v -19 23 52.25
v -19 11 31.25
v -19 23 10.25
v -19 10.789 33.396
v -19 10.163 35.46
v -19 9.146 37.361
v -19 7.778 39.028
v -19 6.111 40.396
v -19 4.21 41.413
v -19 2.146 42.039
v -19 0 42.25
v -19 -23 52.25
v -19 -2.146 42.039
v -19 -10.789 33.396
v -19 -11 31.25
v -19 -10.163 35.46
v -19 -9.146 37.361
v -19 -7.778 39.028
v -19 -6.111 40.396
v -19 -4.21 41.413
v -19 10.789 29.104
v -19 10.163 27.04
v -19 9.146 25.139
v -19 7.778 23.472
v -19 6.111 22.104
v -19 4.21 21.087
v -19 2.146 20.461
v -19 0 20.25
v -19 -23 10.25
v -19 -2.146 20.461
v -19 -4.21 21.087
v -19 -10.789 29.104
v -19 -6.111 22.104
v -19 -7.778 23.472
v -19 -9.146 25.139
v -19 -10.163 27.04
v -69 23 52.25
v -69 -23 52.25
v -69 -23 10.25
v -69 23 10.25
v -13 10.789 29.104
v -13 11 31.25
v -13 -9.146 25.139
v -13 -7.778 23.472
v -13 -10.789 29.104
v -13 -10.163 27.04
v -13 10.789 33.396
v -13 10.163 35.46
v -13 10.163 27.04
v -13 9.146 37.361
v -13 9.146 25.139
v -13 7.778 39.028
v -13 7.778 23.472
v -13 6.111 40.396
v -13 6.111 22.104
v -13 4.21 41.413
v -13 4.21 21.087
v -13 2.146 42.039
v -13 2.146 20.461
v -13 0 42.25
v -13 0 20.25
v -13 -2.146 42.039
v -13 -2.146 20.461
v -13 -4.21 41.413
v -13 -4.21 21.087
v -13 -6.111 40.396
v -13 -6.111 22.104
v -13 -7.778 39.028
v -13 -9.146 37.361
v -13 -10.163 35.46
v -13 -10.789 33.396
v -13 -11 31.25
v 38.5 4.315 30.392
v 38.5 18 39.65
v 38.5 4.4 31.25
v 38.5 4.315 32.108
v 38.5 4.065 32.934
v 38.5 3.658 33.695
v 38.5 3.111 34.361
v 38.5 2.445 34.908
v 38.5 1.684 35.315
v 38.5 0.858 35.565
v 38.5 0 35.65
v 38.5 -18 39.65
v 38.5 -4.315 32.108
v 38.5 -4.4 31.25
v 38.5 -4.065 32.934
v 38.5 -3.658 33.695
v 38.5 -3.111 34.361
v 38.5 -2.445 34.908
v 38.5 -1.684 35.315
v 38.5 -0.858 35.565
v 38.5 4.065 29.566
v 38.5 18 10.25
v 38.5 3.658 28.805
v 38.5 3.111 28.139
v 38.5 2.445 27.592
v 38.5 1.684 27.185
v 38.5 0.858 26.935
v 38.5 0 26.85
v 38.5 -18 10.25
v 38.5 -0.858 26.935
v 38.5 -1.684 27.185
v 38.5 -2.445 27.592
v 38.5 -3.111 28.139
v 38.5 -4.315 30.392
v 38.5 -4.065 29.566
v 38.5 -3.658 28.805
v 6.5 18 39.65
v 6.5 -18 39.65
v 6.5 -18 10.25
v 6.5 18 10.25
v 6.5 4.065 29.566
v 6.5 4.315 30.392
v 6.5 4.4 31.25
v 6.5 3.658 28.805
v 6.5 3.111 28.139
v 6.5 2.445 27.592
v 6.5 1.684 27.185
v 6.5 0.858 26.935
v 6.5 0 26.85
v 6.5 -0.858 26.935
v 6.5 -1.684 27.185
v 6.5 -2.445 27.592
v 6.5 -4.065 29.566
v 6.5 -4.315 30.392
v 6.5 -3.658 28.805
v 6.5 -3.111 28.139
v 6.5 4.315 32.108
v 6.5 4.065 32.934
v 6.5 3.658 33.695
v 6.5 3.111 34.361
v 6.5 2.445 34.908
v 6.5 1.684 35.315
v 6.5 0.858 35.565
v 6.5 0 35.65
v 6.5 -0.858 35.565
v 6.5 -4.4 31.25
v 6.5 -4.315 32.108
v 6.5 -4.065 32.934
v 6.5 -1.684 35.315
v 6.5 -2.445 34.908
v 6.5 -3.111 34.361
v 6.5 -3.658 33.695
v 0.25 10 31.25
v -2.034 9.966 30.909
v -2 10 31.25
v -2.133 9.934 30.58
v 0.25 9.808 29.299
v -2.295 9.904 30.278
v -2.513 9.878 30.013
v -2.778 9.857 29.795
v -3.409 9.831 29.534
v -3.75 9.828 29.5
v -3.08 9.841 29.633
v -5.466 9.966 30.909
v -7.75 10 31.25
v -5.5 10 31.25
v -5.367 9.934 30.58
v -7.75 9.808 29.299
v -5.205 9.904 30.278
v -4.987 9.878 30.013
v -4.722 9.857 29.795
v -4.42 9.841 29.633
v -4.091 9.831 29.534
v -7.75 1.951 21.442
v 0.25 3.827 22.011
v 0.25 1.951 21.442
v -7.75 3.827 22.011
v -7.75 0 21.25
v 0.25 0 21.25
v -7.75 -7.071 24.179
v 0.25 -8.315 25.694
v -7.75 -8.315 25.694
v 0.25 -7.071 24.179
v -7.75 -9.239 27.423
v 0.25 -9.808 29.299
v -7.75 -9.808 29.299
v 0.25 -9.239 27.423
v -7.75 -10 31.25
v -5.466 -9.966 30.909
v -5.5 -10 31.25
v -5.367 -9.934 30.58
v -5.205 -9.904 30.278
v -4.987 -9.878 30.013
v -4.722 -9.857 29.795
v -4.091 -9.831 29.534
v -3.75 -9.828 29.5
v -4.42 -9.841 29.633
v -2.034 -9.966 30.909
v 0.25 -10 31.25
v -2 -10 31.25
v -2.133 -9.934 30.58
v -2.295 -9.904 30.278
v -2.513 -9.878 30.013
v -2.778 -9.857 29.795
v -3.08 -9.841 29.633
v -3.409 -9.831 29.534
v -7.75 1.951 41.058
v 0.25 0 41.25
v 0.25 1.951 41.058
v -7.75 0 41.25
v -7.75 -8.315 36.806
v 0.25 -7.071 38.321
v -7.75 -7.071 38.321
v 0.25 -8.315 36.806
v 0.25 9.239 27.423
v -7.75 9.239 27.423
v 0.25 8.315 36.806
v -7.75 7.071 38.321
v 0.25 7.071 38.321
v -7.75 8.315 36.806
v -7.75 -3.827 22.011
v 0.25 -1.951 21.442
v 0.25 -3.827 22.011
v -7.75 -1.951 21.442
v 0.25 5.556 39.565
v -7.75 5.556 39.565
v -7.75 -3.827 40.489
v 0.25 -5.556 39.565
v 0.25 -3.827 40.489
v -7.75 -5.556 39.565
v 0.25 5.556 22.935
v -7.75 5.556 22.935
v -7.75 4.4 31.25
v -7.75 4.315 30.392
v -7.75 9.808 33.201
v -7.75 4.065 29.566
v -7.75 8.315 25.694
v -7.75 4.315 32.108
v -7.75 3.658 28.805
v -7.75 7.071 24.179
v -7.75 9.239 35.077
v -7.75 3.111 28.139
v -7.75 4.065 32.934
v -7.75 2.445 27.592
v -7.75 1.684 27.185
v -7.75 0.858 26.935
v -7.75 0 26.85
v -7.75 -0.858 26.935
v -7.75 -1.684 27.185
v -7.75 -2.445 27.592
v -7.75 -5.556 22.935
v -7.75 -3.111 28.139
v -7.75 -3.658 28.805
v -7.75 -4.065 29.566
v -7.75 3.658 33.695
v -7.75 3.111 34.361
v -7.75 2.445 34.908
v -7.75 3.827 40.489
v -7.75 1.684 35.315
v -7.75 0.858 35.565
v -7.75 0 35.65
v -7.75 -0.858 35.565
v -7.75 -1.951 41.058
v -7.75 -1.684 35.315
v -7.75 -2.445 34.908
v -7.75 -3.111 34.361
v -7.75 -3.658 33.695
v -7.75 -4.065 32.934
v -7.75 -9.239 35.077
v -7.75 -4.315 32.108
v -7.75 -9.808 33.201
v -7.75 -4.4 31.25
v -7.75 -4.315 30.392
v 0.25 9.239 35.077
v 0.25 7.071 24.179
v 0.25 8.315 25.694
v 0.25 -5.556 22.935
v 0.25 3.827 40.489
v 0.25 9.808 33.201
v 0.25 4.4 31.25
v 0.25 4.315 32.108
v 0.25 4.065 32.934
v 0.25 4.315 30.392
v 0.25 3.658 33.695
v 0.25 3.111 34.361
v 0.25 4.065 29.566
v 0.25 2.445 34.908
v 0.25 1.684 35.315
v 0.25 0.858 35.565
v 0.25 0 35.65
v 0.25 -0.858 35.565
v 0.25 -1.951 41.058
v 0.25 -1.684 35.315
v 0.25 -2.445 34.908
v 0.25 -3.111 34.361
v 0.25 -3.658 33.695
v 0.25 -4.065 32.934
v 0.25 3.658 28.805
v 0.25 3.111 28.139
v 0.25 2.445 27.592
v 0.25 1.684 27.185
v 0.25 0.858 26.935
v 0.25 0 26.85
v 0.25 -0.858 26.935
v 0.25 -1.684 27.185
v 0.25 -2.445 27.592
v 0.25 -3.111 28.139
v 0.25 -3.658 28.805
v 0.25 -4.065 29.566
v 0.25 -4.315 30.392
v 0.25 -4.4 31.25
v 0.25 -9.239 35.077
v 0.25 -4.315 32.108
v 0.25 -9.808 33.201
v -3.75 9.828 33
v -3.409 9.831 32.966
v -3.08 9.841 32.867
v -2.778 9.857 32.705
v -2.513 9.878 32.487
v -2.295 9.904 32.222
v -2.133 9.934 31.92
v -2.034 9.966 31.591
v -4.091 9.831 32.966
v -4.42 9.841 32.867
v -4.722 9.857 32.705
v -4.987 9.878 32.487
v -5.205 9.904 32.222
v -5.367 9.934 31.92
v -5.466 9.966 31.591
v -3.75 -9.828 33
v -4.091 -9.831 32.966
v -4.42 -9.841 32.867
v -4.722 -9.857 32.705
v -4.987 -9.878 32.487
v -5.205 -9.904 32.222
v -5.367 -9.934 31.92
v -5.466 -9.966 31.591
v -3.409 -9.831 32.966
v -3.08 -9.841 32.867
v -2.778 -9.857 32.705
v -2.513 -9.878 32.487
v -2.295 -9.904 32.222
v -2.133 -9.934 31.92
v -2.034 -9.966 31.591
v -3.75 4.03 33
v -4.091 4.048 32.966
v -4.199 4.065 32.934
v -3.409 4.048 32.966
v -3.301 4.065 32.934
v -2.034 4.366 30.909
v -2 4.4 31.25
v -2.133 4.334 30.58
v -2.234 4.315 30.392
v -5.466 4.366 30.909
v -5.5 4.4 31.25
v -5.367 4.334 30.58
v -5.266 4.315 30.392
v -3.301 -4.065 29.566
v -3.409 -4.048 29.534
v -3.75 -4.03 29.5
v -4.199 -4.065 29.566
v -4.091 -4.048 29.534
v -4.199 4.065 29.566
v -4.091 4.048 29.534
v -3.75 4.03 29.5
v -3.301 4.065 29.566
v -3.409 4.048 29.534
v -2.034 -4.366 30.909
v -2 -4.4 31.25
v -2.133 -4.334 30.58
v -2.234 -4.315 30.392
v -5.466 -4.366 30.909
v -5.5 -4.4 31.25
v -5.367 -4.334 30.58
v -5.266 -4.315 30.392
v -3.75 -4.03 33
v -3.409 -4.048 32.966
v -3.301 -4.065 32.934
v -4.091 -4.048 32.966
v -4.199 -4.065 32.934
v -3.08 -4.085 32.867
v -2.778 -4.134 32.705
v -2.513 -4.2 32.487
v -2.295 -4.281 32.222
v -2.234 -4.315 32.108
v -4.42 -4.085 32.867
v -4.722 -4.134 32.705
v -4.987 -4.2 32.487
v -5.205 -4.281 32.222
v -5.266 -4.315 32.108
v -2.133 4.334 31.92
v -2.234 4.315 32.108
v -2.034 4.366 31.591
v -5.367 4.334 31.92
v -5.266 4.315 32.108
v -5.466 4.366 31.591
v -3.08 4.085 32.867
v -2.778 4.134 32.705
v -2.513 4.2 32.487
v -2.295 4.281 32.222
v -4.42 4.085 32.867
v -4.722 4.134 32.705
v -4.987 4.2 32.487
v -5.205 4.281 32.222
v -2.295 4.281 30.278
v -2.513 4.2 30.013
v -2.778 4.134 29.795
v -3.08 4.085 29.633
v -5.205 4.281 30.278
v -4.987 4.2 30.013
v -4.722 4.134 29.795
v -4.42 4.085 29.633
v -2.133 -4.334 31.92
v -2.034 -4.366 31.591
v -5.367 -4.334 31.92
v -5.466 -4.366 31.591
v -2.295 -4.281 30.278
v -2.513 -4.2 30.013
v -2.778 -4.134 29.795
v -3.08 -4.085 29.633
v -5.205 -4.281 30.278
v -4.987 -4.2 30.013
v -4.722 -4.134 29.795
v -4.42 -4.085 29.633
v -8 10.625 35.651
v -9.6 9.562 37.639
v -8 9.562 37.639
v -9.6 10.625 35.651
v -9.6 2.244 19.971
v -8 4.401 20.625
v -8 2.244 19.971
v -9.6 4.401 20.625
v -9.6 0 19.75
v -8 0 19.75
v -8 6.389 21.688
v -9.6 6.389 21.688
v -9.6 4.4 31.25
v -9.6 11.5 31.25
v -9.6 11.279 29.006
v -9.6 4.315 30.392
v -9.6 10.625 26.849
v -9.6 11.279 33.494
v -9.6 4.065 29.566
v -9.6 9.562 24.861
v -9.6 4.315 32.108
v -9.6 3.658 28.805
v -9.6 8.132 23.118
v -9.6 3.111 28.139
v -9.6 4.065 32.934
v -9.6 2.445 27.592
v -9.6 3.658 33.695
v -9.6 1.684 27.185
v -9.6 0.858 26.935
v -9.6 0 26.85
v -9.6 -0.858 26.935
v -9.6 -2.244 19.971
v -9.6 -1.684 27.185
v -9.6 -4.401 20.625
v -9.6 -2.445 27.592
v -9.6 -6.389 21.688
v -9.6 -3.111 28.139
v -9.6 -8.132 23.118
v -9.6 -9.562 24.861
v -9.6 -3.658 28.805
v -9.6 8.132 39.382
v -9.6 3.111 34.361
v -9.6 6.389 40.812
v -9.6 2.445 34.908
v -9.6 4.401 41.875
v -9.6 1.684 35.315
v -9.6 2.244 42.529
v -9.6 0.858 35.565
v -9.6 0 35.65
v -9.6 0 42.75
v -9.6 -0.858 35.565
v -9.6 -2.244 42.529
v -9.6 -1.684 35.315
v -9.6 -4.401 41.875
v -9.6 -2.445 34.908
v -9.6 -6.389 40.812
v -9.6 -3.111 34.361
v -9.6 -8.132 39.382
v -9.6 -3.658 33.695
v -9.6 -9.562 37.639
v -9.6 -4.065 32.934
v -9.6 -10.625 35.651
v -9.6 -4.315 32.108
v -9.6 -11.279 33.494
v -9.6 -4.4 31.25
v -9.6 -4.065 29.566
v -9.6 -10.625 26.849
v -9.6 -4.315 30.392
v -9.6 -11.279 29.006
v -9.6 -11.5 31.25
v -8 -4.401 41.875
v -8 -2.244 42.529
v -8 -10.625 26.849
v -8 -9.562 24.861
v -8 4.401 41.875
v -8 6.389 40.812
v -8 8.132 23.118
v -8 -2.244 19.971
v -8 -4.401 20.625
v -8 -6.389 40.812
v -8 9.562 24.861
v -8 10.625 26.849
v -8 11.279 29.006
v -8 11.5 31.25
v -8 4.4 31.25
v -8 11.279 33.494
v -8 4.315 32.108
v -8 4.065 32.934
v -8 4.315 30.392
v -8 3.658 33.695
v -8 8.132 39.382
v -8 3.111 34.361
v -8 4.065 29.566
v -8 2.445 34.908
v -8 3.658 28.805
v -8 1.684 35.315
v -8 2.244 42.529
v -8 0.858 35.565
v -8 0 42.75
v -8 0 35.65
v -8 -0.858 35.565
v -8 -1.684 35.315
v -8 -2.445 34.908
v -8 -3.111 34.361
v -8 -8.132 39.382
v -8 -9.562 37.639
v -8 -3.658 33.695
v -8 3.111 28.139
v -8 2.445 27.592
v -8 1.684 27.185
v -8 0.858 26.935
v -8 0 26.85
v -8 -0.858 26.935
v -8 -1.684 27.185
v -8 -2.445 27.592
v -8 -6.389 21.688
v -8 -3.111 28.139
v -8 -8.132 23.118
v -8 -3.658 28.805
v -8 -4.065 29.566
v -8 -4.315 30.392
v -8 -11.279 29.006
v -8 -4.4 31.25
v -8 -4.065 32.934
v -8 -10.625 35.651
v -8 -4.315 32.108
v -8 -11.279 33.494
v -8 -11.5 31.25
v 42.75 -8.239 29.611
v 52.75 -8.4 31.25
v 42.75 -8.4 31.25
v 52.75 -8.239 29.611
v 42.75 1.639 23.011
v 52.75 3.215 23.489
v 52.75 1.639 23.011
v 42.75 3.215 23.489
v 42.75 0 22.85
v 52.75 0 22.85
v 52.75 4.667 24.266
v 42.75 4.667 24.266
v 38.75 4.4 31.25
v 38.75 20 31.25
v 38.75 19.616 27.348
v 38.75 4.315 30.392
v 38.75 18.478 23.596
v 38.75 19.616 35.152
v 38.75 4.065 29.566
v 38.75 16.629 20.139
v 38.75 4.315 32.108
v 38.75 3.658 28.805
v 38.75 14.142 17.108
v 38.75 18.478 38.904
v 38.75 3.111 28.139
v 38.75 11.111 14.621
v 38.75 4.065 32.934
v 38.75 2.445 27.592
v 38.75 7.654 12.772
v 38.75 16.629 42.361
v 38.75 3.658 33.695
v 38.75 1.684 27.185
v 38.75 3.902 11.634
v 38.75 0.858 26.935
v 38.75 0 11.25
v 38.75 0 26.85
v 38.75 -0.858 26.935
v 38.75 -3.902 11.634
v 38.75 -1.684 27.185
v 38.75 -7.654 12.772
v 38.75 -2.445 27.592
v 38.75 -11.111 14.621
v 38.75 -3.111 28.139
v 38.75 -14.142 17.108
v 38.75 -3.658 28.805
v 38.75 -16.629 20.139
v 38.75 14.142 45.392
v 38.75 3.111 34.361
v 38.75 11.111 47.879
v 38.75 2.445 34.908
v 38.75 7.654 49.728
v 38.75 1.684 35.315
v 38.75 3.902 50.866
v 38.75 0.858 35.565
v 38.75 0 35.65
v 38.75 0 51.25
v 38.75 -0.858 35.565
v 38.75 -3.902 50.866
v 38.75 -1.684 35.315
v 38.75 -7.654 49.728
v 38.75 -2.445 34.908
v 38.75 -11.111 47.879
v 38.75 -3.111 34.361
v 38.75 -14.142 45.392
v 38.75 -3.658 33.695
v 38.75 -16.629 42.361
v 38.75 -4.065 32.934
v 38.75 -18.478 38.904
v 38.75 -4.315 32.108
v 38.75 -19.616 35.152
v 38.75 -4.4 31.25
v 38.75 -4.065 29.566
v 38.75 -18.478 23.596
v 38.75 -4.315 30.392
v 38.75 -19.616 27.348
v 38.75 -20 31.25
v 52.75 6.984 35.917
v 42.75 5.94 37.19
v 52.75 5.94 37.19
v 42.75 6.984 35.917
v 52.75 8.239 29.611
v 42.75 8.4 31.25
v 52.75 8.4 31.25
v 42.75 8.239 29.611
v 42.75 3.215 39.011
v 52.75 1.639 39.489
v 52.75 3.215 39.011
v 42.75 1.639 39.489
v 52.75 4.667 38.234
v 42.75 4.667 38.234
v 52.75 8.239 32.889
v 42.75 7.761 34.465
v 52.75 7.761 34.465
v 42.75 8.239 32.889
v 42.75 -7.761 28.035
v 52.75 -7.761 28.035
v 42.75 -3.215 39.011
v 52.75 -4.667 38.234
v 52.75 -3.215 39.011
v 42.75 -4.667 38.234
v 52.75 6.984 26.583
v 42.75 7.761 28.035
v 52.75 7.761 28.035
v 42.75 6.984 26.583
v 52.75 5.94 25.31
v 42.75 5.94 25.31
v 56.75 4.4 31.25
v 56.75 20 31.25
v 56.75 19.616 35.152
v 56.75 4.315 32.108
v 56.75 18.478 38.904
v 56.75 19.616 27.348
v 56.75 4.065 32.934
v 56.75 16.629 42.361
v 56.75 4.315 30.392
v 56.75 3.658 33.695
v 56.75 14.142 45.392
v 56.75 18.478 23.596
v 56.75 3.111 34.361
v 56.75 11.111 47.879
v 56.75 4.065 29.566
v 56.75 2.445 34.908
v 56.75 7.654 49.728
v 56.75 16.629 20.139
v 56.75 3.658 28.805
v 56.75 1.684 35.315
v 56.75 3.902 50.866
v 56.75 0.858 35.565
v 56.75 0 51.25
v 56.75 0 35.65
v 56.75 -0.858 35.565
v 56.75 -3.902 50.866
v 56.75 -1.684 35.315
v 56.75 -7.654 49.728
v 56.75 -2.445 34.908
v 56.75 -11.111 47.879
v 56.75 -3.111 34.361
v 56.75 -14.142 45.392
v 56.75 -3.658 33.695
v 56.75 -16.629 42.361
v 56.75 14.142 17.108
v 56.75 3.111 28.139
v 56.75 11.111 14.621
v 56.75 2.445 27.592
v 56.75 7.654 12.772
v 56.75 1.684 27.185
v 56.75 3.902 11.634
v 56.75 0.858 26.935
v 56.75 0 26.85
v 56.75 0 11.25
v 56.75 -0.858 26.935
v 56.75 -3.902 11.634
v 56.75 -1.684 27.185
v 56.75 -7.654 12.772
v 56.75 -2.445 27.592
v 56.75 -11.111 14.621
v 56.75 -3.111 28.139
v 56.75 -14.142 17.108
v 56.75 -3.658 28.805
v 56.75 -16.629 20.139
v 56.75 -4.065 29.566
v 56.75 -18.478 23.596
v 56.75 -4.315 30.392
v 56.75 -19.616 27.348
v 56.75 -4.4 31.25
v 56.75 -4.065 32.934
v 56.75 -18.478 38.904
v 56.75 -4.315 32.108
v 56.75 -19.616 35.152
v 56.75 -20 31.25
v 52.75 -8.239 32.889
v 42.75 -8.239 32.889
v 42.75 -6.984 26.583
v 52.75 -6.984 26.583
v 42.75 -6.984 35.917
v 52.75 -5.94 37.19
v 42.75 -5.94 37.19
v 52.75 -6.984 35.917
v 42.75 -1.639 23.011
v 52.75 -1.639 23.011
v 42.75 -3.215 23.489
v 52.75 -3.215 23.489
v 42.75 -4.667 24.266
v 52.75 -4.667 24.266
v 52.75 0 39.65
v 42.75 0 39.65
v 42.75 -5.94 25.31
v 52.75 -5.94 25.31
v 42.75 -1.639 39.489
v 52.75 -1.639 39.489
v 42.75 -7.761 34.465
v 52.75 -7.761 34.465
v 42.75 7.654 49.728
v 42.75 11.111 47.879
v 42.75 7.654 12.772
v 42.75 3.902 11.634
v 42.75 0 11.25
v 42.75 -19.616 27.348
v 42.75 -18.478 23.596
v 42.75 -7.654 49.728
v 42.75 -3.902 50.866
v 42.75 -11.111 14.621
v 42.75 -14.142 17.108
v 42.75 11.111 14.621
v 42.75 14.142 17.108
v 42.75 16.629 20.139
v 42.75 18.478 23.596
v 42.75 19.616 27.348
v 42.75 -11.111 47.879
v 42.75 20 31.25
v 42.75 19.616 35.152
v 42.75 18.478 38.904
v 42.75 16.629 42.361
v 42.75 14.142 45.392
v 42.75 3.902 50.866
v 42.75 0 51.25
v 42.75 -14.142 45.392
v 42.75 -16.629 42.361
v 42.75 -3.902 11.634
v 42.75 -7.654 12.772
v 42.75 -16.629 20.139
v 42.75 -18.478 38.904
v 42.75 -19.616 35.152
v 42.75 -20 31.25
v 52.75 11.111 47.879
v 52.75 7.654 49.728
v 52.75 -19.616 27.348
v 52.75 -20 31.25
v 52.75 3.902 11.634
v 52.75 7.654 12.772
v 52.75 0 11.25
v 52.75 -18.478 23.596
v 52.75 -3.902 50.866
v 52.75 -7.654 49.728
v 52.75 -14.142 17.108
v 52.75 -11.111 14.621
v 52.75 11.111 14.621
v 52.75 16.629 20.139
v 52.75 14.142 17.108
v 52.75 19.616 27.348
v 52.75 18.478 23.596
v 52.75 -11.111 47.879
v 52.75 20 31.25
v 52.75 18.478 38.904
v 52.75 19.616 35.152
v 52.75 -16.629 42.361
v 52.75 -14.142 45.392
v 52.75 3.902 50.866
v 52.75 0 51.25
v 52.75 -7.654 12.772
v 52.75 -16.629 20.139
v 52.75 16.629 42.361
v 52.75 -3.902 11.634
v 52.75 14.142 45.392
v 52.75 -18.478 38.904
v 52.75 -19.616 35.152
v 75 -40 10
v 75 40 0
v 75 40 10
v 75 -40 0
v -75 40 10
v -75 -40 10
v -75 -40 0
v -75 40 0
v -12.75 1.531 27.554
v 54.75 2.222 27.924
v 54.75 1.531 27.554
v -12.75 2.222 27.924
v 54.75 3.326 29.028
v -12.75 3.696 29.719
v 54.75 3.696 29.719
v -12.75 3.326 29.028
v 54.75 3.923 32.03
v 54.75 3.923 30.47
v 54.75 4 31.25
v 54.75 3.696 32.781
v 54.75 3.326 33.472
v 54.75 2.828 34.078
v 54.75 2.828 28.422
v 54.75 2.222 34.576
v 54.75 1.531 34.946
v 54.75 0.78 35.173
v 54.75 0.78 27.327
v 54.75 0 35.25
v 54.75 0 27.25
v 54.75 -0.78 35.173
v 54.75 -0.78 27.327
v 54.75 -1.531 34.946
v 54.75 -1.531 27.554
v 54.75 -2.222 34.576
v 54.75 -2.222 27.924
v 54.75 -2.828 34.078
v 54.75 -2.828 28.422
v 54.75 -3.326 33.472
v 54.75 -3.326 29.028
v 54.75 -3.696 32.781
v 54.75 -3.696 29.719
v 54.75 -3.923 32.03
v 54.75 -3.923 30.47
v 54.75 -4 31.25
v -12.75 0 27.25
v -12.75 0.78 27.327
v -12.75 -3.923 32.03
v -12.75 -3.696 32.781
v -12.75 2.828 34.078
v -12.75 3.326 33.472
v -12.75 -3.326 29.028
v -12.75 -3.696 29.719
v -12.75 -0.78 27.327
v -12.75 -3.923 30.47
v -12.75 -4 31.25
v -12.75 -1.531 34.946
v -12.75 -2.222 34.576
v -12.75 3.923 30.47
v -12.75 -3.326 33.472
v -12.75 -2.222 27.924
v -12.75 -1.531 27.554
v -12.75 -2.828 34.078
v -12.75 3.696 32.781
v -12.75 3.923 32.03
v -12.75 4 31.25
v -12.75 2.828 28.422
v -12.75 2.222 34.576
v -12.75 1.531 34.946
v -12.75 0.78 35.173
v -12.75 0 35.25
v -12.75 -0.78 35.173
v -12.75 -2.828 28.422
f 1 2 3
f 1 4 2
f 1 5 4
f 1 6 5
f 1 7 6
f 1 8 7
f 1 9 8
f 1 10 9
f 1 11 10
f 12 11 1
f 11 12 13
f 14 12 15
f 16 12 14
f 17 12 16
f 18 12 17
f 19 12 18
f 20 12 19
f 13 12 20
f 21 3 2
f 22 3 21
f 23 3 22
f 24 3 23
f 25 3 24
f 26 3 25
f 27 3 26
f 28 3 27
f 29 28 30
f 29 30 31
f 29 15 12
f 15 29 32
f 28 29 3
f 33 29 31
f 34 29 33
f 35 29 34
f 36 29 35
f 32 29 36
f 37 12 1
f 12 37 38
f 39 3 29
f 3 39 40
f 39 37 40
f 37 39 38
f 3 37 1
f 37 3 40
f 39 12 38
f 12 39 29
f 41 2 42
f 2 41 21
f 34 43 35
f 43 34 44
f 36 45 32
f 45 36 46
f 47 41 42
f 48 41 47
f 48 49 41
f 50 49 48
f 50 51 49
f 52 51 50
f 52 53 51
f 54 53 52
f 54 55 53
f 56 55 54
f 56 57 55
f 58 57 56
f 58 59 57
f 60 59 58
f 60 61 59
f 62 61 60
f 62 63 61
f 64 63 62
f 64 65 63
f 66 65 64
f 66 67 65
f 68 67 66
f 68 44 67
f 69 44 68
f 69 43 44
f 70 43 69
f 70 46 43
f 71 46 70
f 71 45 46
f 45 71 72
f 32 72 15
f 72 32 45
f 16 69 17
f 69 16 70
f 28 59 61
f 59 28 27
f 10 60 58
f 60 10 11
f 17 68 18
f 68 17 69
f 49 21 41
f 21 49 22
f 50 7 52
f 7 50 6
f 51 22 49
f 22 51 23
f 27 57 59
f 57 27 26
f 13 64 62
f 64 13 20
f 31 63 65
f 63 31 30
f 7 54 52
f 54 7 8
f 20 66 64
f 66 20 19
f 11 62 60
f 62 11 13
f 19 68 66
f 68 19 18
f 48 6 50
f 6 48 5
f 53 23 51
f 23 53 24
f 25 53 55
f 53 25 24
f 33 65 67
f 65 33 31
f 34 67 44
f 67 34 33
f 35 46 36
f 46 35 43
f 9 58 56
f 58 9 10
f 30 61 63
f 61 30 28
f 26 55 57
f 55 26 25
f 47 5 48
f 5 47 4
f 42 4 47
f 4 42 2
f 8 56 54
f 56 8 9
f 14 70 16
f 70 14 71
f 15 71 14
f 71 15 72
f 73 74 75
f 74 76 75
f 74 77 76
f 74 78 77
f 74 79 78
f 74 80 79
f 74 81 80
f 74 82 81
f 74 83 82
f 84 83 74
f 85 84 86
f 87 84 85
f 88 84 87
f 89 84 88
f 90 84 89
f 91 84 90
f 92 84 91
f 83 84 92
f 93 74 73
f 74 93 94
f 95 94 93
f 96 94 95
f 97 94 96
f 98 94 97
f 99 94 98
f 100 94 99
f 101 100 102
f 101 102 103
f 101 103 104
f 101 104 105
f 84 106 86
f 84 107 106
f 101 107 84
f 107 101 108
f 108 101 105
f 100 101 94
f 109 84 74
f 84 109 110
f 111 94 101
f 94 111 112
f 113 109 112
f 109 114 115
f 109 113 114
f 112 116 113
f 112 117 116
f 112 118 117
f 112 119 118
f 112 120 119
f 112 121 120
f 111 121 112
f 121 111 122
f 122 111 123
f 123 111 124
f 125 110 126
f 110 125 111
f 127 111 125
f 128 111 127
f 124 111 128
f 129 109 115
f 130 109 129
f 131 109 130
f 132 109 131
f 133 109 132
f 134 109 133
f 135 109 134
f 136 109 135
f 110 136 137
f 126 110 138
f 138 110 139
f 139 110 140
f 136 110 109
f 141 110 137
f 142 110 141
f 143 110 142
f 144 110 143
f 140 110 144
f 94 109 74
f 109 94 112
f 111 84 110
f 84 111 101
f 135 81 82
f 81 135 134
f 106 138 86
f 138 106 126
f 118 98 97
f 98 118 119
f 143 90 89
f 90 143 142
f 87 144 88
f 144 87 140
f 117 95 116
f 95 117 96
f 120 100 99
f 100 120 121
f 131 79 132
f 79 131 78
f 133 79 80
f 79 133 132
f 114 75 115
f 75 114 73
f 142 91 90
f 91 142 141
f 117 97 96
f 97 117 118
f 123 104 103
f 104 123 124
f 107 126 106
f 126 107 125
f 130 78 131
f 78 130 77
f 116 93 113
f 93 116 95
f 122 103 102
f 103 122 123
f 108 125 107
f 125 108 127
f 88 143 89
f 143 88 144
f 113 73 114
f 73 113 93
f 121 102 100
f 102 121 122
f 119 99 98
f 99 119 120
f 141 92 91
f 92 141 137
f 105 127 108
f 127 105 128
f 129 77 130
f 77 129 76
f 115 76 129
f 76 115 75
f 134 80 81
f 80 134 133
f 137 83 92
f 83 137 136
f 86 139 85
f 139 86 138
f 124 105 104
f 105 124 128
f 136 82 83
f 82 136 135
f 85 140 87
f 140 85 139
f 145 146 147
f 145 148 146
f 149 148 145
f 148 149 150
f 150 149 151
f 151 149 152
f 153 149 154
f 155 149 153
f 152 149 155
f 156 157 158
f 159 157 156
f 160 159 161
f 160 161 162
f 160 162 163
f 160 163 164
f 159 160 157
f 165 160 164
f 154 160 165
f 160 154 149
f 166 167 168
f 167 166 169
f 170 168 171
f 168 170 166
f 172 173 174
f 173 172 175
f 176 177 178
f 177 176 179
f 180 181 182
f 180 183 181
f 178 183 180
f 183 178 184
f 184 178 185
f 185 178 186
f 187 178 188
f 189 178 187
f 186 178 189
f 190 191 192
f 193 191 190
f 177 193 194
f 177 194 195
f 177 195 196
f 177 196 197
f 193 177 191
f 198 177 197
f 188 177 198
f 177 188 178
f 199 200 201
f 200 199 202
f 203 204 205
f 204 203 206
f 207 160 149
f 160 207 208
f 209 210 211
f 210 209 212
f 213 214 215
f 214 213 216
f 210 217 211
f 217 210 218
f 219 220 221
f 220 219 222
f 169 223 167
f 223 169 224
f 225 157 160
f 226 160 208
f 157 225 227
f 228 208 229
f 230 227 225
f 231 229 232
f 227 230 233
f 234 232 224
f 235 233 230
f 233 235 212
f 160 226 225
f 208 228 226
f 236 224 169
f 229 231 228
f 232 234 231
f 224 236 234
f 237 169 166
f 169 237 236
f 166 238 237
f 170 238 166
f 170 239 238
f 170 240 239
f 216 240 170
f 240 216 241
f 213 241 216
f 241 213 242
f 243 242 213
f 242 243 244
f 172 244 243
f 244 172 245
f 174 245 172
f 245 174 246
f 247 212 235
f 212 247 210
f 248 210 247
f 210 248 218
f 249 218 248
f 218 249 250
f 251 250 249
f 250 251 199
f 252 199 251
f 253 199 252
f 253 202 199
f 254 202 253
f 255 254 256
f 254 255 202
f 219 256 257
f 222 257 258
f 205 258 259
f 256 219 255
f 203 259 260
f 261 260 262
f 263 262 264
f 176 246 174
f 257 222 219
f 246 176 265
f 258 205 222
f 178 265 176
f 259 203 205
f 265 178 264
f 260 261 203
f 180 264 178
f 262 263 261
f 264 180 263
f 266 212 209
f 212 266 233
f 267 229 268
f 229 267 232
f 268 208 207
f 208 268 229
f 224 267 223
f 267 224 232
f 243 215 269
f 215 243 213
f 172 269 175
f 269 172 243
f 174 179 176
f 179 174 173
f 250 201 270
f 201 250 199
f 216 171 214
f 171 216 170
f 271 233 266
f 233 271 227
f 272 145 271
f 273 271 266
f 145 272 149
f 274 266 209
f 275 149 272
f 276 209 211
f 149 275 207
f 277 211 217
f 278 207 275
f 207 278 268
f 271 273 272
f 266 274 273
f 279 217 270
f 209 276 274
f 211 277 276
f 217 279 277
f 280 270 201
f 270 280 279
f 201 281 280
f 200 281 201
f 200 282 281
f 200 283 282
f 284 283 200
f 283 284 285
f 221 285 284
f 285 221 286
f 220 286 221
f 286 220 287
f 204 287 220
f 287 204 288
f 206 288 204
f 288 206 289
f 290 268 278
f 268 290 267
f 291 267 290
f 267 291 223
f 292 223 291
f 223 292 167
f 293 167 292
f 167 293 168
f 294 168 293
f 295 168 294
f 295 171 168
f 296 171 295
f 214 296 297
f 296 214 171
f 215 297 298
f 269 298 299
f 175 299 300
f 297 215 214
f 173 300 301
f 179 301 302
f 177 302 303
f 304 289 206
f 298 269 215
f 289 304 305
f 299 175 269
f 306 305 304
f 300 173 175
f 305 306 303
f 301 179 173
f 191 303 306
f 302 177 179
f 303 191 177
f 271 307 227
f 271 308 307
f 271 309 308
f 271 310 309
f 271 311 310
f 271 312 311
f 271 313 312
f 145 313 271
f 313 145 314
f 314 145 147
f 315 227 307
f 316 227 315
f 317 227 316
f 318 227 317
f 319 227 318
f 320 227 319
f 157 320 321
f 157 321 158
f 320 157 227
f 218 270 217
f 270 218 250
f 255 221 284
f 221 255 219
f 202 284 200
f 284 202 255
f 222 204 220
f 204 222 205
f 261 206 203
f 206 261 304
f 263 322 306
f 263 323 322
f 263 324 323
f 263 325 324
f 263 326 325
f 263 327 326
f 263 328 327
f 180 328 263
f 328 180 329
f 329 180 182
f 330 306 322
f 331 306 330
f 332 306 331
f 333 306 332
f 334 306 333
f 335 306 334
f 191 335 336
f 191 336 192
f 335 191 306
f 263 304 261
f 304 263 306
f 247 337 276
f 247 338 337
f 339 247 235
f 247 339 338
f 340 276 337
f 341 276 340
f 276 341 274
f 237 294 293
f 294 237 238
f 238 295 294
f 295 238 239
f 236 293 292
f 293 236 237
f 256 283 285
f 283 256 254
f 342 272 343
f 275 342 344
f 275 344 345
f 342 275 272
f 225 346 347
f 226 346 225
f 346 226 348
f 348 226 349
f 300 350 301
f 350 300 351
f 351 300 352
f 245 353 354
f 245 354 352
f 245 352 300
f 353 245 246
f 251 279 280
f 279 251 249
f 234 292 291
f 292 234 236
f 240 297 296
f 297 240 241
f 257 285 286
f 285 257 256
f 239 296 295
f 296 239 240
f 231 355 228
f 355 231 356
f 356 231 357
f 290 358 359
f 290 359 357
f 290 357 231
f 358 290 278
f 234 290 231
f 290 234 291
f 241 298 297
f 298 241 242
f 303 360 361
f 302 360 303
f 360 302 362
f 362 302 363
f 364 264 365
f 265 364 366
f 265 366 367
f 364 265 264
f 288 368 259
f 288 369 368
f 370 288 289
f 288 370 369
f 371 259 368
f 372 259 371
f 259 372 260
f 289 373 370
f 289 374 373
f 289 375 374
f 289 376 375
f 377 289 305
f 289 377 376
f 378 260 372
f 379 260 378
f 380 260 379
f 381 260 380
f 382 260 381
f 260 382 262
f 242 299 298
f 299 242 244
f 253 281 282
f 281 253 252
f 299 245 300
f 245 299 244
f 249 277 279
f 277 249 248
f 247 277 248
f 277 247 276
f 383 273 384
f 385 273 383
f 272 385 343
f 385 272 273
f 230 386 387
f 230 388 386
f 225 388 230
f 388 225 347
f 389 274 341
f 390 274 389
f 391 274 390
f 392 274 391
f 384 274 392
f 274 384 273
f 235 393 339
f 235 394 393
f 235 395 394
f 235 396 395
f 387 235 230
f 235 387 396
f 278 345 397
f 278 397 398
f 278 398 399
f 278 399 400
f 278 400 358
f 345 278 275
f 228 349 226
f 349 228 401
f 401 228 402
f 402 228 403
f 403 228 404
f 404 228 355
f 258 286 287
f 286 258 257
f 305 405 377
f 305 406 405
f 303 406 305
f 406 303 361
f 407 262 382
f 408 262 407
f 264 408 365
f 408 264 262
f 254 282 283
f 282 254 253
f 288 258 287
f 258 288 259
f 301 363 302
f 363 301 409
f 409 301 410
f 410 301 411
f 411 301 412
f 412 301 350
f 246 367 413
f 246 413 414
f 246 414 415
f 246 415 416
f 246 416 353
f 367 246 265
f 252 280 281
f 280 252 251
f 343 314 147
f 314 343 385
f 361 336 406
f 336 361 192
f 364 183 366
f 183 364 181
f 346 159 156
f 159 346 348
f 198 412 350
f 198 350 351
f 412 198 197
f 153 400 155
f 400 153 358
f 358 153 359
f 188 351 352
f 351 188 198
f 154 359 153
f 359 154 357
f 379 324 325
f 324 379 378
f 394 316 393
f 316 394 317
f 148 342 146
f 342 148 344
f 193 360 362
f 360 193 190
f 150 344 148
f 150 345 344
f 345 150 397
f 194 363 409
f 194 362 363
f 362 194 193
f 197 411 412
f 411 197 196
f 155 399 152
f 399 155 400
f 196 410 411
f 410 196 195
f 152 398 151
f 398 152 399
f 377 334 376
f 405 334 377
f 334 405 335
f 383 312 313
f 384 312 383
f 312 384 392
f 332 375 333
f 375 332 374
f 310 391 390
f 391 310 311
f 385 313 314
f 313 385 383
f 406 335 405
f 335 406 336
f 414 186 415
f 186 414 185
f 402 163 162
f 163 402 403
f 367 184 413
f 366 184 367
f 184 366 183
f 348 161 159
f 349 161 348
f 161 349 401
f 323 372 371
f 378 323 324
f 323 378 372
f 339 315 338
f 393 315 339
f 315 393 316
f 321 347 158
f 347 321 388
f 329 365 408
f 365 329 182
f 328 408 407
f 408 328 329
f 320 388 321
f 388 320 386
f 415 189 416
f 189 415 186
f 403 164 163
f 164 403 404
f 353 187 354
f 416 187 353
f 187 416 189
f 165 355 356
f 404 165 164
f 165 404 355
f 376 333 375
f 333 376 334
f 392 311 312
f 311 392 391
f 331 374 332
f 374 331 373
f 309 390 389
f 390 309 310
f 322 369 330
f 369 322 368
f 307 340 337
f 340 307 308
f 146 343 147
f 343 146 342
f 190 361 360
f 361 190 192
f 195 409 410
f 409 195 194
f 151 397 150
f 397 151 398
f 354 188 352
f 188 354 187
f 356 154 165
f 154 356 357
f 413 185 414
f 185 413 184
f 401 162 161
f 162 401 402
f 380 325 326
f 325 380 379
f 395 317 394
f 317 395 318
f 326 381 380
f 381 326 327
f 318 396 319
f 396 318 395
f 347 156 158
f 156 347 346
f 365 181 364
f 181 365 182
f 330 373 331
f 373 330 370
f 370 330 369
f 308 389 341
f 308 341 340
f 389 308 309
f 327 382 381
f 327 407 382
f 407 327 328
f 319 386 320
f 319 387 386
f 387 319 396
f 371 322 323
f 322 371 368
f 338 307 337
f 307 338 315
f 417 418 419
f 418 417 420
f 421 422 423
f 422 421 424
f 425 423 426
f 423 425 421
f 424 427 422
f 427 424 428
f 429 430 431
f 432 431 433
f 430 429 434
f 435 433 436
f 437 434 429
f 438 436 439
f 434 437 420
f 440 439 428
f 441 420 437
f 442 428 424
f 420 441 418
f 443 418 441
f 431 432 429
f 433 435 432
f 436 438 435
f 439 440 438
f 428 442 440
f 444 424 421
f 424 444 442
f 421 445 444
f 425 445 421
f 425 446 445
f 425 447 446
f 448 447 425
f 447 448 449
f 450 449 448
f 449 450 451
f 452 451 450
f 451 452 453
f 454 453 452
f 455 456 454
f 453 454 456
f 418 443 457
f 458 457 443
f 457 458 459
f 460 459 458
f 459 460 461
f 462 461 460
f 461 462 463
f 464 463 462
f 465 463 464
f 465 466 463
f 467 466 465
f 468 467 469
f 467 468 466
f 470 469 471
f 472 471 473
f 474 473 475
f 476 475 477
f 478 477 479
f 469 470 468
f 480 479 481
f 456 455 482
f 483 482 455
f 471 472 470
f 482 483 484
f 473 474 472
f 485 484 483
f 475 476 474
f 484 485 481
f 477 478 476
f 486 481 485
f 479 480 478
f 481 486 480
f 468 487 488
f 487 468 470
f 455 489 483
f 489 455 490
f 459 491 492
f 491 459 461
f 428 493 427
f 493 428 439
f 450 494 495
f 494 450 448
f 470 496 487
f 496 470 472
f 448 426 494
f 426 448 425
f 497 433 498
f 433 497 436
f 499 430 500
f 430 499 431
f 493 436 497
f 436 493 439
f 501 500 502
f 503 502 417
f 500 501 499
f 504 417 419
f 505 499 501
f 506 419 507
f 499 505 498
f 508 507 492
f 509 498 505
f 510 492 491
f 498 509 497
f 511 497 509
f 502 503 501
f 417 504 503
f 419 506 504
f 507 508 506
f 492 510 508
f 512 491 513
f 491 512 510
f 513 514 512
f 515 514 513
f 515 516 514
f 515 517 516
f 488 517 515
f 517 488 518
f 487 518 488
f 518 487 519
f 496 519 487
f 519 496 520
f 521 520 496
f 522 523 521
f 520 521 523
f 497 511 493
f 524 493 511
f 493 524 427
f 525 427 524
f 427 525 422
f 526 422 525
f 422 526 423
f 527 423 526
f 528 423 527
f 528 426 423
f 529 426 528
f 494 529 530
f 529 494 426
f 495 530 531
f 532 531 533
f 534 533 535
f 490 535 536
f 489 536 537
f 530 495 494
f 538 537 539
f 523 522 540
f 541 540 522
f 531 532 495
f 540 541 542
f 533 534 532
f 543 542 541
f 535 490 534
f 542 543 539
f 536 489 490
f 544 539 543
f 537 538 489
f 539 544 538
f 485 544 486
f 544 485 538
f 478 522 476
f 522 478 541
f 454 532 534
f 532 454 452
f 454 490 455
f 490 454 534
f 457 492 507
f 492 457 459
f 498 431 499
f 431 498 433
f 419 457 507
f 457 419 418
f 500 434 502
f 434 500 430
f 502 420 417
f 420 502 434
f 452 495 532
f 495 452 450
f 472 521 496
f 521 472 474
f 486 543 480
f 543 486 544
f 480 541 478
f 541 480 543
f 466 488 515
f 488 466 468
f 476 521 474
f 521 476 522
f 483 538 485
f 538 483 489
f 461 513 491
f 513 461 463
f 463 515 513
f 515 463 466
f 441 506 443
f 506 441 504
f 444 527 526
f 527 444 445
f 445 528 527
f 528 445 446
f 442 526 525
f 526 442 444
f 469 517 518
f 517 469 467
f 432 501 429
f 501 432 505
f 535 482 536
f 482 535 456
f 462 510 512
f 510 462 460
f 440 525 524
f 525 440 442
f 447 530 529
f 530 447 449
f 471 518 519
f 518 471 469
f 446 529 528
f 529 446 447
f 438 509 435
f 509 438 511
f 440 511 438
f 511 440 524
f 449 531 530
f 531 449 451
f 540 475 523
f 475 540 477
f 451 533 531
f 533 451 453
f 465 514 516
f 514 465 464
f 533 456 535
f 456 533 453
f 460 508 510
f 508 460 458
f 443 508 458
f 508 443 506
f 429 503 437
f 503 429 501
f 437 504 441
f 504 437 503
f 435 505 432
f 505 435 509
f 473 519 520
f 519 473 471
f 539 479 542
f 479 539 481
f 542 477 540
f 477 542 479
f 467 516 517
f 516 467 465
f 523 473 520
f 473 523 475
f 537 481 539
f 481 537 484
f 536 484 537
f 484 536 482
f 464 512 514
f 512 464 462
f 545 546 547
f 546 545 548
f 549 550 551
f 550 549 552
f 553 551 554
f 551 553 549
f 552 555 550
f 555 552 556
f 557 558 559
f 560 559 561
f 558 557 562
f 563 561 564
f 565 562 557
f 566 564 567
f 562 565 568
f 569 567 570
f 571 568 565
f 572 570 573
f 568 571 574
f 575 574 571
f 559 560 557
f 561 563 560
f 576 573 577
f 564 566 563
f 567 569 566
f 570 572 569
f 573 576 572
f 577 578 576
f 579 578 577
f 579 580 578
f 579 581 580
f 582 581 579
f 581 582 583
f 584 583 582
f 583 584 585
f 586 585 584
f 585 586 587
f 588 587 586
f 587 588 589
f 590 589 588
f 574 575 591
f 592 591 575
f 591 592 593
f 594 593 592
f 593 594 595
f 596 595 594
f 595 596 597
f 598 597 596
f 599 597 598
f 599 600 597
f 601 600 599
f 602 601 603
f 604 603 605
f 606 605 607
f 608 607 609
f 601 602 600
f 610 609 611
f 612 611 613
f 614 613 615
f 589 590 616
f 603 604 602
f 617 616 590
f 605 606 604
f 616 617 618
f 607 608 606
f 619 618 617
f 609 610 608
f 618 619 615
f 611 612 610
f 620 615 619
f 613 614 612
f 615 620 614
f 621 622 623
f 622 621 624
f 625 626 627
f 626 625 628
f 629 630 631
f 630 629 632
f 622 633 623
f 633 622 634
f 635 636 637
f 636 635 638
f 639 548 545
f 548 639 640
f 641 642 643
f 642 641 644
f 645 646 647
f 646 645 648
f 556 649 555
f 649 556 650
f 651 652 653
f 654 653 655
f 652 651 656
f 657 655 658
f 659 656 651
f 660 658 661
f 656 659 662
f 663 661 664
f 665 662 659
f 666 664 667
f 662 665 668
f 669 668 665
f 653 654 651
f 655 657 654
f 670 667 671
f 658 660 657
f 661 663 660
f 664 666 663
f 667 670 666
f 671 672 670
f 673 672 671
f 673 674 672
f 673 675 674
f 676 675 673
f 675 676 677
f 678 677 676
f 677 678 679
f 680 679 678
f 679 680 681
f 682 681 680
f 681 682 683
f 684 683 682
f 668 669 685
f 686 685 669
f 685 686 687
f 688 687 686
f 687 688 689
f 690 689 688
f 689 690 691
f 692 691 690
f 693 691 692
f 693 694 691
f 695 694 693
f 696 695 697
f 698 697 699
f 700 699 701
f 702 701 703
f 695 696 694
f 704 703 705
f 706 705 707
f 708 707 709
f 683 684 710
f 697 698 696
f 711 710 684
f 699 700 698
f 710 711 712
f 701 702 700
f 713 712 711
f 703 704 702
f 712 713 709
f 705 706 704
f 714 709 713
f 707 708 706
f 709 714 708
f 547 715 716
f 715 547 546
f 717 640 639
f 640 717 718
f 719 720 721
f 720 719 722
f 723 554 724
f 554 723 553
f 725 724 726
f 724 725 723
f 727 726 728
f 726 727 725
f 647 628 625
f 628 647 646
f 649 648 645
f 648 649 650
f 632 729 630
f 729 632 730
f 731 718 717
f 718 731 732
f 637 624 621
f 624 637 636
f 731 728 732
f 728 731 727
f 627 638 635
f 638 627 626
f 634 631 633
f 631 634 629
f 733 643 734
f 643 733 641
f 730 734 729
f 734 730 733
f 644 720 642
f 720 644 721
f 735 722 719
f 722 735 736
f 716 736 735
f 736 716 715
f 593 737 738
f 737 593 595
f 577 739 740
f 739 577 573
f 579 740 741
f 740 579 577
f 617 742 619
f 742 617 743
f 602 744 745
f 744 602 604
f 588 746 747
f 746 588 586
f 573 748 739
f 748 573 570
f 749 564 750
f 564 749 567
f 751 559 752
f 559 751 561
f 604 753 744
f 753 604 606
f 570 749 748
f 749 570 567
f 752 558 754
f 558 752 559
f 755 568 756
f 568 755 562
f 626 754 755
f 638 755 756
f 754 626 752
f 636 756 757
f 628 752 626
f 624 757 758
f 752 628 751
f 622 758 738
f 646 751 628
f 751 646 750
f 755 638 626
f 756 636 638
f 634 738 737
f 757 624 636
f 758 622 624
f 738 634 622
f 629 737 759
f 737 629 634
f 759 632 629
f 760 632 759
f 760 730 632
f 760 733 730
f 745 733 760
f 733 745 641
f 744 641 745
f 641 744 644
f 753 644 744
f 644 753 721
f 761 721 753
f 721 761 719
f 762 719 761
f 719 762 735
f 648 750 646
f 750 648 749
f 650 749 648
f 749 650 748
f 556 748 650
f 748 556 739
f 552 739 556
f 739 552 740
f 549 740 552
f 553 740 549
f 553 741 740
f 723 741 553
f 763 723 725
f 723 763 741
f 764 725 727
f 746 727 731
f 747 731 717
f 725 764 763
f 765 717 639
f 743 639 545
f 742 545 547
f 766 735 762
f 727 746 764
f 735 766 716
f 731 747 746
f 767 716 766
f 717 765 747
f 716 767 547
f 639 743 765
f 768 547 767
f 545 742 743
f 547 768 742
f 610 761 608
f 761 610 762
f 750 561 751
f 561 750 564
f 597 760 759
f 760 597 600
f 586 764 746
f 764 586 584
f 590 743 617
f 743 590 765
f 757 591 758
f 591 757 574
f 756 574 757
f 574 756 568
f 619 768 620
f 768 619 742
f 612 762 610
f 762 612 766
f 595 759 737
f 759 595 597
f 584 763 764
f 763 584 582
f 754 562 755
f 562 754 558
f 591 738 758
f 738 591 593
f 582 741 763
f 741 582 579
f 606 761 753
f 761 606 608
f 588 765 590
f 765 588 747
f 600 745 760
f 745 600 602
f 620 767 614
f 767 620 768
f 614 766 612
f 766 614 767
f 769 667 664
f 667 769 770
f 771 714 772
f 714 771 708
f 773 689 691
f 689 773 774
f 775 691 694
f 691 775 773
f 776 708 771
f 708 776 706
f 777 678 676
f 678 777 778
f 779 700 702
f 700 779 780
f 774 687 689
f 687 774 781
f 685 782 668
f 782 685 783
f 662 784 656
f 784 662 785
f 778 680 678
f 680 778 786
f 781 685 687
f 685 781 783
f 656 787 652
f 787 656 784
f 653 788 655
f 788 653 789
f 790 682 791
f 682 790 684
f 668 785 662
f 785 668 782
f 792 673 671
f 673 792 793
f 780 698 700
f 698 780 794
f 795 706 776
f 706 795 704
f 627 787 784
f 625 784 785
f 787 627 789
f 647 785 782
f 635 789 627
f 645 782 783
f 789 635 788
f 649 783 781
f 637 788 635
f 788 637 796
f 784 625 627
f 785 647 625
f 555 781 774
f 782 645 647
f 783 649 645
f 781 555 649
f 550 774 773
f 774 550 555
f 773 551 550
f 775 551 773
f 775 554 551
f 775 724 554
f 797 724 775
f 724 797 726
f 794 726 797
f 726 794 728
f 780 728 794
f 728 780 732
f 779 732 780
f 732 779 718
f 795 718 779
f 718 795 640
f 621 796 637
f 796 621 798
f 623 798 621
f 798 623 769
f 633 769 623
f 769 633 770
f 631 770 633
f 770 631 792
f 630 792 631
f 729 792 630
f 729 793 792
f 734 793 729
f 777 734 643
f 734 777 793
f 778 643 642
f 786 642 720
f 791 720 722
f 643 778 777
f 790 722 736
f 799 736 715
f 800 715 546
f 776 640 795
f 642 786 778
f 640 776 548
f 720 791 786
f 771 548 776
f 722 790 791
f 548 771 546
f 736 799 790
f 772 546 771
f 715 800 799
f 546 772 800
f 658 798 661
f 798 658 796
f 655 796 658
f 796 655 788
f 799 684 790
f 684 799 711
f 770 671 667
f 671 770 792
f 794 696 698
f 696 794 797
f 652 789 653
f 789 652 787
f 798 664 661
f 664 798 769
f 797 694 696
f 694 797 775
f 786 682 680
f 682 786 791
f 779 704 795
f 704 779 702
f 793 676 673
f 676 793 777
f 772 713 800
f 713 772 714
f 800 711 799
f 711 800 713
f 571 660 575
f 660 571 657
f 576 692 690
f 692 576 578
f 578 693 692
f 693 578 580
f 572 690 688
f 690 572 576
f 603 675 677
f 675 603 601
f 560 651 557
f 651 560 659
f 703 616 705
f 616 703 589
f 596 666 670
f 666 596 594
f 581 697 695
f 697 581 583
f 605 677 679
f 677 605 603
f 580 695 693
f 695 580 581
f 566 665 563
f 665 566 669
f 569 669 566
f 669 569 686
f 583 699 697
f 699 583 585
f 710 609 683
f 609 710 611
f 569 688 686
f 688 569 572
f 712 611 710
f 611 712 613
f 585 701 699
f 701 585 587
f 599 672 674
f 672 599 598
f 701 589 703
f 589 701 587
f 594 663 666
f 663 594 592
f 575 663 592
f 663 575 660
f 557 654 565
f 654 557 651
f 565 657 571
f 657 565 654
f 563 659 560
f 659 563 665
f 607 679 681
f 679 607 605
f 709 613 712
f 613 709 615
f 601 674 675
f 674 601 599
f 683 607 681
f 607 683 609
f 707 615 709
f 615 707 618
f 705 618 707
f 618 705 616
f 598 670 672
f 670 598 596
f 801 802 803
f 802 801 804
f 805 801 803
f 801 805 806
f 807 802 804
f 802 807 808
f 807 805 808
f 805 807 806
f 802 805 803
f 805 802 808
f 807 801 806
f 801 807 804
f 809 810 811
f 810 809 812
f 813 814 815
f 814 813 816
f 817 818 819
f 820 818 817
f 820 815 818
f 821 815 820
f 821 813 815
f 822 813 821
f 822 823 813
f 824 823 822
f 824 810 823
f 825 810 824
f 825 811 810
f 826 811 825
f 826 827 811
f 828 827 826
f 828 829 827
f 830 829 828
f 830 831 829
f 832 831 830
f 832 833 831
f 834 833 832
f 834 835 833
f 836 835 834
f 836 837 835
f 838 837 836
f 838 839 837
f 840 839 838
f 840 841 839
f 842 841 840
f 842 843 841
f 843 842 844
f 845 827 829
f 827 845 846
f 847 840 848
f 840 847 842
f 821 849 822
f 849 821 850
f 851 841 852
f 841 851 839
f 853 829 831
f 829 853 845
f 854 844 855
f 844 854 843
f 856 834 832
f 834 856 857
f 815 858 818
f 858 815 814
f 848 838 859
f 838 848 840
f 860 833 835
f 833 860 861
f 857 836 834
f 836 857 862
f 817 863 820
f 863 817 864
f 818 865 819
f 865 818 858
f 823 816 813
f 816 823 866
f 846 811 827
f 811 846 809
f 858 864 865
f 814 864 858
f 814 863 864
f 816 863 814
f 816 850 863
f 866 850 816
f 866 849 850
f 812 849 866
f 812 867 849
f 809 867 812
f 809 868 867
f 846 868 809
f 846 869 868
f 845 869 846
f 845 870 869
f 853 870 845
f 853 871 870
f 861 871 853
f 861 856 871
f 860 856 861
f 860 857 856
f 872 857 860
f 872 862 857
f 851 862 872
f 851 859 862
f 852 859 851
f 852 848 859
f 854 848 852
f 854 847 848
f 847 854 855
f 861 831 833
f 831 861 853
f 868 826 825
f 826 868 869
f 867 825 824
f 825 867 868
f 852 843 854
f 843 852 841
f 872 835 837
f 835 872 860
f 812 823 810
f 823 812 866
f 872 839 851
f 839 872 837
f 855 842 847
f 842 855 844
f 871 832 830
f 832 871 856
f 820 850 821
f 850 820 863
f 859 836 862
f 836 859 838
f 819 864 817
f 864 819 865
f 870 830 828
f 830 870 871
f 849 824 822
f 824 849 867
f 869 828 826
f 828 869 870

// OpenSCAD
$fn = 32;

// ------------------------------------------------------------------------
// Motor drive station: motor 50 x 42 mm, shaft d8, pulley d40
// Every part is its own module, assembly() places every instance.
// ------------------------------------------------------------------------

// --- part 1 ---
module station_bed() {
  difference() {
    translate([-75, -40, 0]) cube([150, 80, 10]);
  }
}

// --- part 2 ---
module drive_motor() {
  union() {
    translate([-25, -23, 0]) cube([50, 46, 42]);
    translate([28, 0, 21]) rotate([0, 90, 0]) cylinder(h = 6, d = 22, center = true);
  }
}

// --- part 3 ---
module pillow_block() {
  difference() {
    translate([-16, -18, 0]) cube([32, 36, 29.4]);
    translate([0, 0, 21]) rotate([0, 90, 0]) cylinder(h = 34, d = 8.8, center = true);
  }
}

// --- part 4 ---
module drive_shaft() {
  translate([0, 0, -33.75]) cylinder(h = 67.5, d = 8);
}

// --- part 5 ---
module shaft_collar() {
  difference() {
    cylinder(h = 8, d = 20);
    translate([0, 0, -1]) cylinder(h = 10, d = 8.8);
    translate([0, 0, 4]) rotate([90, 0, 0]) cylinder(h = 22, d = 3.5, center = true);
  }
}

// --- part 6 ---
module collar_washer() {
  difference() {
      translate([0, 0, 0]) cylinder(h = 1.6, d = 23);
      translate([0, 0, -1]) cylinder(h = 3.6, d = 8.8);
    }
}

// --- part 7 ---
module drive_pulley() {
  difference() {
    union() {
      cylinder(h = 18, d = 16.8);
      cylinder(h = 4, d = 40);
      translate([0, 0, 14]) cylinder(h = 4, d = 40);
    }
    translate([0, 0, -1]) cylinder(h = 20, d = 8.8);
  }
}

// --- assembly ---
module assembly() {
  color([0.80, 0.24, 0.20]) translate([0, 0, 0]) rotate([0, 0, 0]) station_bed();
  color([0.20, 0.45, 0.75]) translate([-44, 0, 10.25]) rotate([0, 0, 0]) drive_motor();
  color([0.25, 0.62, 0.32]) translate([22.5, 0, 10.25]) rotate([0, 0, 0]) pillow_block();
  color([0.92, 0.70, 0.18]) translate([21, 0, 31.25]) rotate([0, 90, 0]) drive_shaft();
  color([0.58, 0.35, 0.70]) translate([-7.75, 0, 31.25]) rotate([0, 90, 0]) shaft_collar();
  color([0.16, 0.66, 0.66]) translate([-9.6, 0, 31.25]) rotate([0, 90, 0]) collar_washer();
  color([0.85, 0.48, 0.18]) translate([38.75, 0, 31.25]) rotate([0, 90, 0]) drive_pulley();
}

assembly();
